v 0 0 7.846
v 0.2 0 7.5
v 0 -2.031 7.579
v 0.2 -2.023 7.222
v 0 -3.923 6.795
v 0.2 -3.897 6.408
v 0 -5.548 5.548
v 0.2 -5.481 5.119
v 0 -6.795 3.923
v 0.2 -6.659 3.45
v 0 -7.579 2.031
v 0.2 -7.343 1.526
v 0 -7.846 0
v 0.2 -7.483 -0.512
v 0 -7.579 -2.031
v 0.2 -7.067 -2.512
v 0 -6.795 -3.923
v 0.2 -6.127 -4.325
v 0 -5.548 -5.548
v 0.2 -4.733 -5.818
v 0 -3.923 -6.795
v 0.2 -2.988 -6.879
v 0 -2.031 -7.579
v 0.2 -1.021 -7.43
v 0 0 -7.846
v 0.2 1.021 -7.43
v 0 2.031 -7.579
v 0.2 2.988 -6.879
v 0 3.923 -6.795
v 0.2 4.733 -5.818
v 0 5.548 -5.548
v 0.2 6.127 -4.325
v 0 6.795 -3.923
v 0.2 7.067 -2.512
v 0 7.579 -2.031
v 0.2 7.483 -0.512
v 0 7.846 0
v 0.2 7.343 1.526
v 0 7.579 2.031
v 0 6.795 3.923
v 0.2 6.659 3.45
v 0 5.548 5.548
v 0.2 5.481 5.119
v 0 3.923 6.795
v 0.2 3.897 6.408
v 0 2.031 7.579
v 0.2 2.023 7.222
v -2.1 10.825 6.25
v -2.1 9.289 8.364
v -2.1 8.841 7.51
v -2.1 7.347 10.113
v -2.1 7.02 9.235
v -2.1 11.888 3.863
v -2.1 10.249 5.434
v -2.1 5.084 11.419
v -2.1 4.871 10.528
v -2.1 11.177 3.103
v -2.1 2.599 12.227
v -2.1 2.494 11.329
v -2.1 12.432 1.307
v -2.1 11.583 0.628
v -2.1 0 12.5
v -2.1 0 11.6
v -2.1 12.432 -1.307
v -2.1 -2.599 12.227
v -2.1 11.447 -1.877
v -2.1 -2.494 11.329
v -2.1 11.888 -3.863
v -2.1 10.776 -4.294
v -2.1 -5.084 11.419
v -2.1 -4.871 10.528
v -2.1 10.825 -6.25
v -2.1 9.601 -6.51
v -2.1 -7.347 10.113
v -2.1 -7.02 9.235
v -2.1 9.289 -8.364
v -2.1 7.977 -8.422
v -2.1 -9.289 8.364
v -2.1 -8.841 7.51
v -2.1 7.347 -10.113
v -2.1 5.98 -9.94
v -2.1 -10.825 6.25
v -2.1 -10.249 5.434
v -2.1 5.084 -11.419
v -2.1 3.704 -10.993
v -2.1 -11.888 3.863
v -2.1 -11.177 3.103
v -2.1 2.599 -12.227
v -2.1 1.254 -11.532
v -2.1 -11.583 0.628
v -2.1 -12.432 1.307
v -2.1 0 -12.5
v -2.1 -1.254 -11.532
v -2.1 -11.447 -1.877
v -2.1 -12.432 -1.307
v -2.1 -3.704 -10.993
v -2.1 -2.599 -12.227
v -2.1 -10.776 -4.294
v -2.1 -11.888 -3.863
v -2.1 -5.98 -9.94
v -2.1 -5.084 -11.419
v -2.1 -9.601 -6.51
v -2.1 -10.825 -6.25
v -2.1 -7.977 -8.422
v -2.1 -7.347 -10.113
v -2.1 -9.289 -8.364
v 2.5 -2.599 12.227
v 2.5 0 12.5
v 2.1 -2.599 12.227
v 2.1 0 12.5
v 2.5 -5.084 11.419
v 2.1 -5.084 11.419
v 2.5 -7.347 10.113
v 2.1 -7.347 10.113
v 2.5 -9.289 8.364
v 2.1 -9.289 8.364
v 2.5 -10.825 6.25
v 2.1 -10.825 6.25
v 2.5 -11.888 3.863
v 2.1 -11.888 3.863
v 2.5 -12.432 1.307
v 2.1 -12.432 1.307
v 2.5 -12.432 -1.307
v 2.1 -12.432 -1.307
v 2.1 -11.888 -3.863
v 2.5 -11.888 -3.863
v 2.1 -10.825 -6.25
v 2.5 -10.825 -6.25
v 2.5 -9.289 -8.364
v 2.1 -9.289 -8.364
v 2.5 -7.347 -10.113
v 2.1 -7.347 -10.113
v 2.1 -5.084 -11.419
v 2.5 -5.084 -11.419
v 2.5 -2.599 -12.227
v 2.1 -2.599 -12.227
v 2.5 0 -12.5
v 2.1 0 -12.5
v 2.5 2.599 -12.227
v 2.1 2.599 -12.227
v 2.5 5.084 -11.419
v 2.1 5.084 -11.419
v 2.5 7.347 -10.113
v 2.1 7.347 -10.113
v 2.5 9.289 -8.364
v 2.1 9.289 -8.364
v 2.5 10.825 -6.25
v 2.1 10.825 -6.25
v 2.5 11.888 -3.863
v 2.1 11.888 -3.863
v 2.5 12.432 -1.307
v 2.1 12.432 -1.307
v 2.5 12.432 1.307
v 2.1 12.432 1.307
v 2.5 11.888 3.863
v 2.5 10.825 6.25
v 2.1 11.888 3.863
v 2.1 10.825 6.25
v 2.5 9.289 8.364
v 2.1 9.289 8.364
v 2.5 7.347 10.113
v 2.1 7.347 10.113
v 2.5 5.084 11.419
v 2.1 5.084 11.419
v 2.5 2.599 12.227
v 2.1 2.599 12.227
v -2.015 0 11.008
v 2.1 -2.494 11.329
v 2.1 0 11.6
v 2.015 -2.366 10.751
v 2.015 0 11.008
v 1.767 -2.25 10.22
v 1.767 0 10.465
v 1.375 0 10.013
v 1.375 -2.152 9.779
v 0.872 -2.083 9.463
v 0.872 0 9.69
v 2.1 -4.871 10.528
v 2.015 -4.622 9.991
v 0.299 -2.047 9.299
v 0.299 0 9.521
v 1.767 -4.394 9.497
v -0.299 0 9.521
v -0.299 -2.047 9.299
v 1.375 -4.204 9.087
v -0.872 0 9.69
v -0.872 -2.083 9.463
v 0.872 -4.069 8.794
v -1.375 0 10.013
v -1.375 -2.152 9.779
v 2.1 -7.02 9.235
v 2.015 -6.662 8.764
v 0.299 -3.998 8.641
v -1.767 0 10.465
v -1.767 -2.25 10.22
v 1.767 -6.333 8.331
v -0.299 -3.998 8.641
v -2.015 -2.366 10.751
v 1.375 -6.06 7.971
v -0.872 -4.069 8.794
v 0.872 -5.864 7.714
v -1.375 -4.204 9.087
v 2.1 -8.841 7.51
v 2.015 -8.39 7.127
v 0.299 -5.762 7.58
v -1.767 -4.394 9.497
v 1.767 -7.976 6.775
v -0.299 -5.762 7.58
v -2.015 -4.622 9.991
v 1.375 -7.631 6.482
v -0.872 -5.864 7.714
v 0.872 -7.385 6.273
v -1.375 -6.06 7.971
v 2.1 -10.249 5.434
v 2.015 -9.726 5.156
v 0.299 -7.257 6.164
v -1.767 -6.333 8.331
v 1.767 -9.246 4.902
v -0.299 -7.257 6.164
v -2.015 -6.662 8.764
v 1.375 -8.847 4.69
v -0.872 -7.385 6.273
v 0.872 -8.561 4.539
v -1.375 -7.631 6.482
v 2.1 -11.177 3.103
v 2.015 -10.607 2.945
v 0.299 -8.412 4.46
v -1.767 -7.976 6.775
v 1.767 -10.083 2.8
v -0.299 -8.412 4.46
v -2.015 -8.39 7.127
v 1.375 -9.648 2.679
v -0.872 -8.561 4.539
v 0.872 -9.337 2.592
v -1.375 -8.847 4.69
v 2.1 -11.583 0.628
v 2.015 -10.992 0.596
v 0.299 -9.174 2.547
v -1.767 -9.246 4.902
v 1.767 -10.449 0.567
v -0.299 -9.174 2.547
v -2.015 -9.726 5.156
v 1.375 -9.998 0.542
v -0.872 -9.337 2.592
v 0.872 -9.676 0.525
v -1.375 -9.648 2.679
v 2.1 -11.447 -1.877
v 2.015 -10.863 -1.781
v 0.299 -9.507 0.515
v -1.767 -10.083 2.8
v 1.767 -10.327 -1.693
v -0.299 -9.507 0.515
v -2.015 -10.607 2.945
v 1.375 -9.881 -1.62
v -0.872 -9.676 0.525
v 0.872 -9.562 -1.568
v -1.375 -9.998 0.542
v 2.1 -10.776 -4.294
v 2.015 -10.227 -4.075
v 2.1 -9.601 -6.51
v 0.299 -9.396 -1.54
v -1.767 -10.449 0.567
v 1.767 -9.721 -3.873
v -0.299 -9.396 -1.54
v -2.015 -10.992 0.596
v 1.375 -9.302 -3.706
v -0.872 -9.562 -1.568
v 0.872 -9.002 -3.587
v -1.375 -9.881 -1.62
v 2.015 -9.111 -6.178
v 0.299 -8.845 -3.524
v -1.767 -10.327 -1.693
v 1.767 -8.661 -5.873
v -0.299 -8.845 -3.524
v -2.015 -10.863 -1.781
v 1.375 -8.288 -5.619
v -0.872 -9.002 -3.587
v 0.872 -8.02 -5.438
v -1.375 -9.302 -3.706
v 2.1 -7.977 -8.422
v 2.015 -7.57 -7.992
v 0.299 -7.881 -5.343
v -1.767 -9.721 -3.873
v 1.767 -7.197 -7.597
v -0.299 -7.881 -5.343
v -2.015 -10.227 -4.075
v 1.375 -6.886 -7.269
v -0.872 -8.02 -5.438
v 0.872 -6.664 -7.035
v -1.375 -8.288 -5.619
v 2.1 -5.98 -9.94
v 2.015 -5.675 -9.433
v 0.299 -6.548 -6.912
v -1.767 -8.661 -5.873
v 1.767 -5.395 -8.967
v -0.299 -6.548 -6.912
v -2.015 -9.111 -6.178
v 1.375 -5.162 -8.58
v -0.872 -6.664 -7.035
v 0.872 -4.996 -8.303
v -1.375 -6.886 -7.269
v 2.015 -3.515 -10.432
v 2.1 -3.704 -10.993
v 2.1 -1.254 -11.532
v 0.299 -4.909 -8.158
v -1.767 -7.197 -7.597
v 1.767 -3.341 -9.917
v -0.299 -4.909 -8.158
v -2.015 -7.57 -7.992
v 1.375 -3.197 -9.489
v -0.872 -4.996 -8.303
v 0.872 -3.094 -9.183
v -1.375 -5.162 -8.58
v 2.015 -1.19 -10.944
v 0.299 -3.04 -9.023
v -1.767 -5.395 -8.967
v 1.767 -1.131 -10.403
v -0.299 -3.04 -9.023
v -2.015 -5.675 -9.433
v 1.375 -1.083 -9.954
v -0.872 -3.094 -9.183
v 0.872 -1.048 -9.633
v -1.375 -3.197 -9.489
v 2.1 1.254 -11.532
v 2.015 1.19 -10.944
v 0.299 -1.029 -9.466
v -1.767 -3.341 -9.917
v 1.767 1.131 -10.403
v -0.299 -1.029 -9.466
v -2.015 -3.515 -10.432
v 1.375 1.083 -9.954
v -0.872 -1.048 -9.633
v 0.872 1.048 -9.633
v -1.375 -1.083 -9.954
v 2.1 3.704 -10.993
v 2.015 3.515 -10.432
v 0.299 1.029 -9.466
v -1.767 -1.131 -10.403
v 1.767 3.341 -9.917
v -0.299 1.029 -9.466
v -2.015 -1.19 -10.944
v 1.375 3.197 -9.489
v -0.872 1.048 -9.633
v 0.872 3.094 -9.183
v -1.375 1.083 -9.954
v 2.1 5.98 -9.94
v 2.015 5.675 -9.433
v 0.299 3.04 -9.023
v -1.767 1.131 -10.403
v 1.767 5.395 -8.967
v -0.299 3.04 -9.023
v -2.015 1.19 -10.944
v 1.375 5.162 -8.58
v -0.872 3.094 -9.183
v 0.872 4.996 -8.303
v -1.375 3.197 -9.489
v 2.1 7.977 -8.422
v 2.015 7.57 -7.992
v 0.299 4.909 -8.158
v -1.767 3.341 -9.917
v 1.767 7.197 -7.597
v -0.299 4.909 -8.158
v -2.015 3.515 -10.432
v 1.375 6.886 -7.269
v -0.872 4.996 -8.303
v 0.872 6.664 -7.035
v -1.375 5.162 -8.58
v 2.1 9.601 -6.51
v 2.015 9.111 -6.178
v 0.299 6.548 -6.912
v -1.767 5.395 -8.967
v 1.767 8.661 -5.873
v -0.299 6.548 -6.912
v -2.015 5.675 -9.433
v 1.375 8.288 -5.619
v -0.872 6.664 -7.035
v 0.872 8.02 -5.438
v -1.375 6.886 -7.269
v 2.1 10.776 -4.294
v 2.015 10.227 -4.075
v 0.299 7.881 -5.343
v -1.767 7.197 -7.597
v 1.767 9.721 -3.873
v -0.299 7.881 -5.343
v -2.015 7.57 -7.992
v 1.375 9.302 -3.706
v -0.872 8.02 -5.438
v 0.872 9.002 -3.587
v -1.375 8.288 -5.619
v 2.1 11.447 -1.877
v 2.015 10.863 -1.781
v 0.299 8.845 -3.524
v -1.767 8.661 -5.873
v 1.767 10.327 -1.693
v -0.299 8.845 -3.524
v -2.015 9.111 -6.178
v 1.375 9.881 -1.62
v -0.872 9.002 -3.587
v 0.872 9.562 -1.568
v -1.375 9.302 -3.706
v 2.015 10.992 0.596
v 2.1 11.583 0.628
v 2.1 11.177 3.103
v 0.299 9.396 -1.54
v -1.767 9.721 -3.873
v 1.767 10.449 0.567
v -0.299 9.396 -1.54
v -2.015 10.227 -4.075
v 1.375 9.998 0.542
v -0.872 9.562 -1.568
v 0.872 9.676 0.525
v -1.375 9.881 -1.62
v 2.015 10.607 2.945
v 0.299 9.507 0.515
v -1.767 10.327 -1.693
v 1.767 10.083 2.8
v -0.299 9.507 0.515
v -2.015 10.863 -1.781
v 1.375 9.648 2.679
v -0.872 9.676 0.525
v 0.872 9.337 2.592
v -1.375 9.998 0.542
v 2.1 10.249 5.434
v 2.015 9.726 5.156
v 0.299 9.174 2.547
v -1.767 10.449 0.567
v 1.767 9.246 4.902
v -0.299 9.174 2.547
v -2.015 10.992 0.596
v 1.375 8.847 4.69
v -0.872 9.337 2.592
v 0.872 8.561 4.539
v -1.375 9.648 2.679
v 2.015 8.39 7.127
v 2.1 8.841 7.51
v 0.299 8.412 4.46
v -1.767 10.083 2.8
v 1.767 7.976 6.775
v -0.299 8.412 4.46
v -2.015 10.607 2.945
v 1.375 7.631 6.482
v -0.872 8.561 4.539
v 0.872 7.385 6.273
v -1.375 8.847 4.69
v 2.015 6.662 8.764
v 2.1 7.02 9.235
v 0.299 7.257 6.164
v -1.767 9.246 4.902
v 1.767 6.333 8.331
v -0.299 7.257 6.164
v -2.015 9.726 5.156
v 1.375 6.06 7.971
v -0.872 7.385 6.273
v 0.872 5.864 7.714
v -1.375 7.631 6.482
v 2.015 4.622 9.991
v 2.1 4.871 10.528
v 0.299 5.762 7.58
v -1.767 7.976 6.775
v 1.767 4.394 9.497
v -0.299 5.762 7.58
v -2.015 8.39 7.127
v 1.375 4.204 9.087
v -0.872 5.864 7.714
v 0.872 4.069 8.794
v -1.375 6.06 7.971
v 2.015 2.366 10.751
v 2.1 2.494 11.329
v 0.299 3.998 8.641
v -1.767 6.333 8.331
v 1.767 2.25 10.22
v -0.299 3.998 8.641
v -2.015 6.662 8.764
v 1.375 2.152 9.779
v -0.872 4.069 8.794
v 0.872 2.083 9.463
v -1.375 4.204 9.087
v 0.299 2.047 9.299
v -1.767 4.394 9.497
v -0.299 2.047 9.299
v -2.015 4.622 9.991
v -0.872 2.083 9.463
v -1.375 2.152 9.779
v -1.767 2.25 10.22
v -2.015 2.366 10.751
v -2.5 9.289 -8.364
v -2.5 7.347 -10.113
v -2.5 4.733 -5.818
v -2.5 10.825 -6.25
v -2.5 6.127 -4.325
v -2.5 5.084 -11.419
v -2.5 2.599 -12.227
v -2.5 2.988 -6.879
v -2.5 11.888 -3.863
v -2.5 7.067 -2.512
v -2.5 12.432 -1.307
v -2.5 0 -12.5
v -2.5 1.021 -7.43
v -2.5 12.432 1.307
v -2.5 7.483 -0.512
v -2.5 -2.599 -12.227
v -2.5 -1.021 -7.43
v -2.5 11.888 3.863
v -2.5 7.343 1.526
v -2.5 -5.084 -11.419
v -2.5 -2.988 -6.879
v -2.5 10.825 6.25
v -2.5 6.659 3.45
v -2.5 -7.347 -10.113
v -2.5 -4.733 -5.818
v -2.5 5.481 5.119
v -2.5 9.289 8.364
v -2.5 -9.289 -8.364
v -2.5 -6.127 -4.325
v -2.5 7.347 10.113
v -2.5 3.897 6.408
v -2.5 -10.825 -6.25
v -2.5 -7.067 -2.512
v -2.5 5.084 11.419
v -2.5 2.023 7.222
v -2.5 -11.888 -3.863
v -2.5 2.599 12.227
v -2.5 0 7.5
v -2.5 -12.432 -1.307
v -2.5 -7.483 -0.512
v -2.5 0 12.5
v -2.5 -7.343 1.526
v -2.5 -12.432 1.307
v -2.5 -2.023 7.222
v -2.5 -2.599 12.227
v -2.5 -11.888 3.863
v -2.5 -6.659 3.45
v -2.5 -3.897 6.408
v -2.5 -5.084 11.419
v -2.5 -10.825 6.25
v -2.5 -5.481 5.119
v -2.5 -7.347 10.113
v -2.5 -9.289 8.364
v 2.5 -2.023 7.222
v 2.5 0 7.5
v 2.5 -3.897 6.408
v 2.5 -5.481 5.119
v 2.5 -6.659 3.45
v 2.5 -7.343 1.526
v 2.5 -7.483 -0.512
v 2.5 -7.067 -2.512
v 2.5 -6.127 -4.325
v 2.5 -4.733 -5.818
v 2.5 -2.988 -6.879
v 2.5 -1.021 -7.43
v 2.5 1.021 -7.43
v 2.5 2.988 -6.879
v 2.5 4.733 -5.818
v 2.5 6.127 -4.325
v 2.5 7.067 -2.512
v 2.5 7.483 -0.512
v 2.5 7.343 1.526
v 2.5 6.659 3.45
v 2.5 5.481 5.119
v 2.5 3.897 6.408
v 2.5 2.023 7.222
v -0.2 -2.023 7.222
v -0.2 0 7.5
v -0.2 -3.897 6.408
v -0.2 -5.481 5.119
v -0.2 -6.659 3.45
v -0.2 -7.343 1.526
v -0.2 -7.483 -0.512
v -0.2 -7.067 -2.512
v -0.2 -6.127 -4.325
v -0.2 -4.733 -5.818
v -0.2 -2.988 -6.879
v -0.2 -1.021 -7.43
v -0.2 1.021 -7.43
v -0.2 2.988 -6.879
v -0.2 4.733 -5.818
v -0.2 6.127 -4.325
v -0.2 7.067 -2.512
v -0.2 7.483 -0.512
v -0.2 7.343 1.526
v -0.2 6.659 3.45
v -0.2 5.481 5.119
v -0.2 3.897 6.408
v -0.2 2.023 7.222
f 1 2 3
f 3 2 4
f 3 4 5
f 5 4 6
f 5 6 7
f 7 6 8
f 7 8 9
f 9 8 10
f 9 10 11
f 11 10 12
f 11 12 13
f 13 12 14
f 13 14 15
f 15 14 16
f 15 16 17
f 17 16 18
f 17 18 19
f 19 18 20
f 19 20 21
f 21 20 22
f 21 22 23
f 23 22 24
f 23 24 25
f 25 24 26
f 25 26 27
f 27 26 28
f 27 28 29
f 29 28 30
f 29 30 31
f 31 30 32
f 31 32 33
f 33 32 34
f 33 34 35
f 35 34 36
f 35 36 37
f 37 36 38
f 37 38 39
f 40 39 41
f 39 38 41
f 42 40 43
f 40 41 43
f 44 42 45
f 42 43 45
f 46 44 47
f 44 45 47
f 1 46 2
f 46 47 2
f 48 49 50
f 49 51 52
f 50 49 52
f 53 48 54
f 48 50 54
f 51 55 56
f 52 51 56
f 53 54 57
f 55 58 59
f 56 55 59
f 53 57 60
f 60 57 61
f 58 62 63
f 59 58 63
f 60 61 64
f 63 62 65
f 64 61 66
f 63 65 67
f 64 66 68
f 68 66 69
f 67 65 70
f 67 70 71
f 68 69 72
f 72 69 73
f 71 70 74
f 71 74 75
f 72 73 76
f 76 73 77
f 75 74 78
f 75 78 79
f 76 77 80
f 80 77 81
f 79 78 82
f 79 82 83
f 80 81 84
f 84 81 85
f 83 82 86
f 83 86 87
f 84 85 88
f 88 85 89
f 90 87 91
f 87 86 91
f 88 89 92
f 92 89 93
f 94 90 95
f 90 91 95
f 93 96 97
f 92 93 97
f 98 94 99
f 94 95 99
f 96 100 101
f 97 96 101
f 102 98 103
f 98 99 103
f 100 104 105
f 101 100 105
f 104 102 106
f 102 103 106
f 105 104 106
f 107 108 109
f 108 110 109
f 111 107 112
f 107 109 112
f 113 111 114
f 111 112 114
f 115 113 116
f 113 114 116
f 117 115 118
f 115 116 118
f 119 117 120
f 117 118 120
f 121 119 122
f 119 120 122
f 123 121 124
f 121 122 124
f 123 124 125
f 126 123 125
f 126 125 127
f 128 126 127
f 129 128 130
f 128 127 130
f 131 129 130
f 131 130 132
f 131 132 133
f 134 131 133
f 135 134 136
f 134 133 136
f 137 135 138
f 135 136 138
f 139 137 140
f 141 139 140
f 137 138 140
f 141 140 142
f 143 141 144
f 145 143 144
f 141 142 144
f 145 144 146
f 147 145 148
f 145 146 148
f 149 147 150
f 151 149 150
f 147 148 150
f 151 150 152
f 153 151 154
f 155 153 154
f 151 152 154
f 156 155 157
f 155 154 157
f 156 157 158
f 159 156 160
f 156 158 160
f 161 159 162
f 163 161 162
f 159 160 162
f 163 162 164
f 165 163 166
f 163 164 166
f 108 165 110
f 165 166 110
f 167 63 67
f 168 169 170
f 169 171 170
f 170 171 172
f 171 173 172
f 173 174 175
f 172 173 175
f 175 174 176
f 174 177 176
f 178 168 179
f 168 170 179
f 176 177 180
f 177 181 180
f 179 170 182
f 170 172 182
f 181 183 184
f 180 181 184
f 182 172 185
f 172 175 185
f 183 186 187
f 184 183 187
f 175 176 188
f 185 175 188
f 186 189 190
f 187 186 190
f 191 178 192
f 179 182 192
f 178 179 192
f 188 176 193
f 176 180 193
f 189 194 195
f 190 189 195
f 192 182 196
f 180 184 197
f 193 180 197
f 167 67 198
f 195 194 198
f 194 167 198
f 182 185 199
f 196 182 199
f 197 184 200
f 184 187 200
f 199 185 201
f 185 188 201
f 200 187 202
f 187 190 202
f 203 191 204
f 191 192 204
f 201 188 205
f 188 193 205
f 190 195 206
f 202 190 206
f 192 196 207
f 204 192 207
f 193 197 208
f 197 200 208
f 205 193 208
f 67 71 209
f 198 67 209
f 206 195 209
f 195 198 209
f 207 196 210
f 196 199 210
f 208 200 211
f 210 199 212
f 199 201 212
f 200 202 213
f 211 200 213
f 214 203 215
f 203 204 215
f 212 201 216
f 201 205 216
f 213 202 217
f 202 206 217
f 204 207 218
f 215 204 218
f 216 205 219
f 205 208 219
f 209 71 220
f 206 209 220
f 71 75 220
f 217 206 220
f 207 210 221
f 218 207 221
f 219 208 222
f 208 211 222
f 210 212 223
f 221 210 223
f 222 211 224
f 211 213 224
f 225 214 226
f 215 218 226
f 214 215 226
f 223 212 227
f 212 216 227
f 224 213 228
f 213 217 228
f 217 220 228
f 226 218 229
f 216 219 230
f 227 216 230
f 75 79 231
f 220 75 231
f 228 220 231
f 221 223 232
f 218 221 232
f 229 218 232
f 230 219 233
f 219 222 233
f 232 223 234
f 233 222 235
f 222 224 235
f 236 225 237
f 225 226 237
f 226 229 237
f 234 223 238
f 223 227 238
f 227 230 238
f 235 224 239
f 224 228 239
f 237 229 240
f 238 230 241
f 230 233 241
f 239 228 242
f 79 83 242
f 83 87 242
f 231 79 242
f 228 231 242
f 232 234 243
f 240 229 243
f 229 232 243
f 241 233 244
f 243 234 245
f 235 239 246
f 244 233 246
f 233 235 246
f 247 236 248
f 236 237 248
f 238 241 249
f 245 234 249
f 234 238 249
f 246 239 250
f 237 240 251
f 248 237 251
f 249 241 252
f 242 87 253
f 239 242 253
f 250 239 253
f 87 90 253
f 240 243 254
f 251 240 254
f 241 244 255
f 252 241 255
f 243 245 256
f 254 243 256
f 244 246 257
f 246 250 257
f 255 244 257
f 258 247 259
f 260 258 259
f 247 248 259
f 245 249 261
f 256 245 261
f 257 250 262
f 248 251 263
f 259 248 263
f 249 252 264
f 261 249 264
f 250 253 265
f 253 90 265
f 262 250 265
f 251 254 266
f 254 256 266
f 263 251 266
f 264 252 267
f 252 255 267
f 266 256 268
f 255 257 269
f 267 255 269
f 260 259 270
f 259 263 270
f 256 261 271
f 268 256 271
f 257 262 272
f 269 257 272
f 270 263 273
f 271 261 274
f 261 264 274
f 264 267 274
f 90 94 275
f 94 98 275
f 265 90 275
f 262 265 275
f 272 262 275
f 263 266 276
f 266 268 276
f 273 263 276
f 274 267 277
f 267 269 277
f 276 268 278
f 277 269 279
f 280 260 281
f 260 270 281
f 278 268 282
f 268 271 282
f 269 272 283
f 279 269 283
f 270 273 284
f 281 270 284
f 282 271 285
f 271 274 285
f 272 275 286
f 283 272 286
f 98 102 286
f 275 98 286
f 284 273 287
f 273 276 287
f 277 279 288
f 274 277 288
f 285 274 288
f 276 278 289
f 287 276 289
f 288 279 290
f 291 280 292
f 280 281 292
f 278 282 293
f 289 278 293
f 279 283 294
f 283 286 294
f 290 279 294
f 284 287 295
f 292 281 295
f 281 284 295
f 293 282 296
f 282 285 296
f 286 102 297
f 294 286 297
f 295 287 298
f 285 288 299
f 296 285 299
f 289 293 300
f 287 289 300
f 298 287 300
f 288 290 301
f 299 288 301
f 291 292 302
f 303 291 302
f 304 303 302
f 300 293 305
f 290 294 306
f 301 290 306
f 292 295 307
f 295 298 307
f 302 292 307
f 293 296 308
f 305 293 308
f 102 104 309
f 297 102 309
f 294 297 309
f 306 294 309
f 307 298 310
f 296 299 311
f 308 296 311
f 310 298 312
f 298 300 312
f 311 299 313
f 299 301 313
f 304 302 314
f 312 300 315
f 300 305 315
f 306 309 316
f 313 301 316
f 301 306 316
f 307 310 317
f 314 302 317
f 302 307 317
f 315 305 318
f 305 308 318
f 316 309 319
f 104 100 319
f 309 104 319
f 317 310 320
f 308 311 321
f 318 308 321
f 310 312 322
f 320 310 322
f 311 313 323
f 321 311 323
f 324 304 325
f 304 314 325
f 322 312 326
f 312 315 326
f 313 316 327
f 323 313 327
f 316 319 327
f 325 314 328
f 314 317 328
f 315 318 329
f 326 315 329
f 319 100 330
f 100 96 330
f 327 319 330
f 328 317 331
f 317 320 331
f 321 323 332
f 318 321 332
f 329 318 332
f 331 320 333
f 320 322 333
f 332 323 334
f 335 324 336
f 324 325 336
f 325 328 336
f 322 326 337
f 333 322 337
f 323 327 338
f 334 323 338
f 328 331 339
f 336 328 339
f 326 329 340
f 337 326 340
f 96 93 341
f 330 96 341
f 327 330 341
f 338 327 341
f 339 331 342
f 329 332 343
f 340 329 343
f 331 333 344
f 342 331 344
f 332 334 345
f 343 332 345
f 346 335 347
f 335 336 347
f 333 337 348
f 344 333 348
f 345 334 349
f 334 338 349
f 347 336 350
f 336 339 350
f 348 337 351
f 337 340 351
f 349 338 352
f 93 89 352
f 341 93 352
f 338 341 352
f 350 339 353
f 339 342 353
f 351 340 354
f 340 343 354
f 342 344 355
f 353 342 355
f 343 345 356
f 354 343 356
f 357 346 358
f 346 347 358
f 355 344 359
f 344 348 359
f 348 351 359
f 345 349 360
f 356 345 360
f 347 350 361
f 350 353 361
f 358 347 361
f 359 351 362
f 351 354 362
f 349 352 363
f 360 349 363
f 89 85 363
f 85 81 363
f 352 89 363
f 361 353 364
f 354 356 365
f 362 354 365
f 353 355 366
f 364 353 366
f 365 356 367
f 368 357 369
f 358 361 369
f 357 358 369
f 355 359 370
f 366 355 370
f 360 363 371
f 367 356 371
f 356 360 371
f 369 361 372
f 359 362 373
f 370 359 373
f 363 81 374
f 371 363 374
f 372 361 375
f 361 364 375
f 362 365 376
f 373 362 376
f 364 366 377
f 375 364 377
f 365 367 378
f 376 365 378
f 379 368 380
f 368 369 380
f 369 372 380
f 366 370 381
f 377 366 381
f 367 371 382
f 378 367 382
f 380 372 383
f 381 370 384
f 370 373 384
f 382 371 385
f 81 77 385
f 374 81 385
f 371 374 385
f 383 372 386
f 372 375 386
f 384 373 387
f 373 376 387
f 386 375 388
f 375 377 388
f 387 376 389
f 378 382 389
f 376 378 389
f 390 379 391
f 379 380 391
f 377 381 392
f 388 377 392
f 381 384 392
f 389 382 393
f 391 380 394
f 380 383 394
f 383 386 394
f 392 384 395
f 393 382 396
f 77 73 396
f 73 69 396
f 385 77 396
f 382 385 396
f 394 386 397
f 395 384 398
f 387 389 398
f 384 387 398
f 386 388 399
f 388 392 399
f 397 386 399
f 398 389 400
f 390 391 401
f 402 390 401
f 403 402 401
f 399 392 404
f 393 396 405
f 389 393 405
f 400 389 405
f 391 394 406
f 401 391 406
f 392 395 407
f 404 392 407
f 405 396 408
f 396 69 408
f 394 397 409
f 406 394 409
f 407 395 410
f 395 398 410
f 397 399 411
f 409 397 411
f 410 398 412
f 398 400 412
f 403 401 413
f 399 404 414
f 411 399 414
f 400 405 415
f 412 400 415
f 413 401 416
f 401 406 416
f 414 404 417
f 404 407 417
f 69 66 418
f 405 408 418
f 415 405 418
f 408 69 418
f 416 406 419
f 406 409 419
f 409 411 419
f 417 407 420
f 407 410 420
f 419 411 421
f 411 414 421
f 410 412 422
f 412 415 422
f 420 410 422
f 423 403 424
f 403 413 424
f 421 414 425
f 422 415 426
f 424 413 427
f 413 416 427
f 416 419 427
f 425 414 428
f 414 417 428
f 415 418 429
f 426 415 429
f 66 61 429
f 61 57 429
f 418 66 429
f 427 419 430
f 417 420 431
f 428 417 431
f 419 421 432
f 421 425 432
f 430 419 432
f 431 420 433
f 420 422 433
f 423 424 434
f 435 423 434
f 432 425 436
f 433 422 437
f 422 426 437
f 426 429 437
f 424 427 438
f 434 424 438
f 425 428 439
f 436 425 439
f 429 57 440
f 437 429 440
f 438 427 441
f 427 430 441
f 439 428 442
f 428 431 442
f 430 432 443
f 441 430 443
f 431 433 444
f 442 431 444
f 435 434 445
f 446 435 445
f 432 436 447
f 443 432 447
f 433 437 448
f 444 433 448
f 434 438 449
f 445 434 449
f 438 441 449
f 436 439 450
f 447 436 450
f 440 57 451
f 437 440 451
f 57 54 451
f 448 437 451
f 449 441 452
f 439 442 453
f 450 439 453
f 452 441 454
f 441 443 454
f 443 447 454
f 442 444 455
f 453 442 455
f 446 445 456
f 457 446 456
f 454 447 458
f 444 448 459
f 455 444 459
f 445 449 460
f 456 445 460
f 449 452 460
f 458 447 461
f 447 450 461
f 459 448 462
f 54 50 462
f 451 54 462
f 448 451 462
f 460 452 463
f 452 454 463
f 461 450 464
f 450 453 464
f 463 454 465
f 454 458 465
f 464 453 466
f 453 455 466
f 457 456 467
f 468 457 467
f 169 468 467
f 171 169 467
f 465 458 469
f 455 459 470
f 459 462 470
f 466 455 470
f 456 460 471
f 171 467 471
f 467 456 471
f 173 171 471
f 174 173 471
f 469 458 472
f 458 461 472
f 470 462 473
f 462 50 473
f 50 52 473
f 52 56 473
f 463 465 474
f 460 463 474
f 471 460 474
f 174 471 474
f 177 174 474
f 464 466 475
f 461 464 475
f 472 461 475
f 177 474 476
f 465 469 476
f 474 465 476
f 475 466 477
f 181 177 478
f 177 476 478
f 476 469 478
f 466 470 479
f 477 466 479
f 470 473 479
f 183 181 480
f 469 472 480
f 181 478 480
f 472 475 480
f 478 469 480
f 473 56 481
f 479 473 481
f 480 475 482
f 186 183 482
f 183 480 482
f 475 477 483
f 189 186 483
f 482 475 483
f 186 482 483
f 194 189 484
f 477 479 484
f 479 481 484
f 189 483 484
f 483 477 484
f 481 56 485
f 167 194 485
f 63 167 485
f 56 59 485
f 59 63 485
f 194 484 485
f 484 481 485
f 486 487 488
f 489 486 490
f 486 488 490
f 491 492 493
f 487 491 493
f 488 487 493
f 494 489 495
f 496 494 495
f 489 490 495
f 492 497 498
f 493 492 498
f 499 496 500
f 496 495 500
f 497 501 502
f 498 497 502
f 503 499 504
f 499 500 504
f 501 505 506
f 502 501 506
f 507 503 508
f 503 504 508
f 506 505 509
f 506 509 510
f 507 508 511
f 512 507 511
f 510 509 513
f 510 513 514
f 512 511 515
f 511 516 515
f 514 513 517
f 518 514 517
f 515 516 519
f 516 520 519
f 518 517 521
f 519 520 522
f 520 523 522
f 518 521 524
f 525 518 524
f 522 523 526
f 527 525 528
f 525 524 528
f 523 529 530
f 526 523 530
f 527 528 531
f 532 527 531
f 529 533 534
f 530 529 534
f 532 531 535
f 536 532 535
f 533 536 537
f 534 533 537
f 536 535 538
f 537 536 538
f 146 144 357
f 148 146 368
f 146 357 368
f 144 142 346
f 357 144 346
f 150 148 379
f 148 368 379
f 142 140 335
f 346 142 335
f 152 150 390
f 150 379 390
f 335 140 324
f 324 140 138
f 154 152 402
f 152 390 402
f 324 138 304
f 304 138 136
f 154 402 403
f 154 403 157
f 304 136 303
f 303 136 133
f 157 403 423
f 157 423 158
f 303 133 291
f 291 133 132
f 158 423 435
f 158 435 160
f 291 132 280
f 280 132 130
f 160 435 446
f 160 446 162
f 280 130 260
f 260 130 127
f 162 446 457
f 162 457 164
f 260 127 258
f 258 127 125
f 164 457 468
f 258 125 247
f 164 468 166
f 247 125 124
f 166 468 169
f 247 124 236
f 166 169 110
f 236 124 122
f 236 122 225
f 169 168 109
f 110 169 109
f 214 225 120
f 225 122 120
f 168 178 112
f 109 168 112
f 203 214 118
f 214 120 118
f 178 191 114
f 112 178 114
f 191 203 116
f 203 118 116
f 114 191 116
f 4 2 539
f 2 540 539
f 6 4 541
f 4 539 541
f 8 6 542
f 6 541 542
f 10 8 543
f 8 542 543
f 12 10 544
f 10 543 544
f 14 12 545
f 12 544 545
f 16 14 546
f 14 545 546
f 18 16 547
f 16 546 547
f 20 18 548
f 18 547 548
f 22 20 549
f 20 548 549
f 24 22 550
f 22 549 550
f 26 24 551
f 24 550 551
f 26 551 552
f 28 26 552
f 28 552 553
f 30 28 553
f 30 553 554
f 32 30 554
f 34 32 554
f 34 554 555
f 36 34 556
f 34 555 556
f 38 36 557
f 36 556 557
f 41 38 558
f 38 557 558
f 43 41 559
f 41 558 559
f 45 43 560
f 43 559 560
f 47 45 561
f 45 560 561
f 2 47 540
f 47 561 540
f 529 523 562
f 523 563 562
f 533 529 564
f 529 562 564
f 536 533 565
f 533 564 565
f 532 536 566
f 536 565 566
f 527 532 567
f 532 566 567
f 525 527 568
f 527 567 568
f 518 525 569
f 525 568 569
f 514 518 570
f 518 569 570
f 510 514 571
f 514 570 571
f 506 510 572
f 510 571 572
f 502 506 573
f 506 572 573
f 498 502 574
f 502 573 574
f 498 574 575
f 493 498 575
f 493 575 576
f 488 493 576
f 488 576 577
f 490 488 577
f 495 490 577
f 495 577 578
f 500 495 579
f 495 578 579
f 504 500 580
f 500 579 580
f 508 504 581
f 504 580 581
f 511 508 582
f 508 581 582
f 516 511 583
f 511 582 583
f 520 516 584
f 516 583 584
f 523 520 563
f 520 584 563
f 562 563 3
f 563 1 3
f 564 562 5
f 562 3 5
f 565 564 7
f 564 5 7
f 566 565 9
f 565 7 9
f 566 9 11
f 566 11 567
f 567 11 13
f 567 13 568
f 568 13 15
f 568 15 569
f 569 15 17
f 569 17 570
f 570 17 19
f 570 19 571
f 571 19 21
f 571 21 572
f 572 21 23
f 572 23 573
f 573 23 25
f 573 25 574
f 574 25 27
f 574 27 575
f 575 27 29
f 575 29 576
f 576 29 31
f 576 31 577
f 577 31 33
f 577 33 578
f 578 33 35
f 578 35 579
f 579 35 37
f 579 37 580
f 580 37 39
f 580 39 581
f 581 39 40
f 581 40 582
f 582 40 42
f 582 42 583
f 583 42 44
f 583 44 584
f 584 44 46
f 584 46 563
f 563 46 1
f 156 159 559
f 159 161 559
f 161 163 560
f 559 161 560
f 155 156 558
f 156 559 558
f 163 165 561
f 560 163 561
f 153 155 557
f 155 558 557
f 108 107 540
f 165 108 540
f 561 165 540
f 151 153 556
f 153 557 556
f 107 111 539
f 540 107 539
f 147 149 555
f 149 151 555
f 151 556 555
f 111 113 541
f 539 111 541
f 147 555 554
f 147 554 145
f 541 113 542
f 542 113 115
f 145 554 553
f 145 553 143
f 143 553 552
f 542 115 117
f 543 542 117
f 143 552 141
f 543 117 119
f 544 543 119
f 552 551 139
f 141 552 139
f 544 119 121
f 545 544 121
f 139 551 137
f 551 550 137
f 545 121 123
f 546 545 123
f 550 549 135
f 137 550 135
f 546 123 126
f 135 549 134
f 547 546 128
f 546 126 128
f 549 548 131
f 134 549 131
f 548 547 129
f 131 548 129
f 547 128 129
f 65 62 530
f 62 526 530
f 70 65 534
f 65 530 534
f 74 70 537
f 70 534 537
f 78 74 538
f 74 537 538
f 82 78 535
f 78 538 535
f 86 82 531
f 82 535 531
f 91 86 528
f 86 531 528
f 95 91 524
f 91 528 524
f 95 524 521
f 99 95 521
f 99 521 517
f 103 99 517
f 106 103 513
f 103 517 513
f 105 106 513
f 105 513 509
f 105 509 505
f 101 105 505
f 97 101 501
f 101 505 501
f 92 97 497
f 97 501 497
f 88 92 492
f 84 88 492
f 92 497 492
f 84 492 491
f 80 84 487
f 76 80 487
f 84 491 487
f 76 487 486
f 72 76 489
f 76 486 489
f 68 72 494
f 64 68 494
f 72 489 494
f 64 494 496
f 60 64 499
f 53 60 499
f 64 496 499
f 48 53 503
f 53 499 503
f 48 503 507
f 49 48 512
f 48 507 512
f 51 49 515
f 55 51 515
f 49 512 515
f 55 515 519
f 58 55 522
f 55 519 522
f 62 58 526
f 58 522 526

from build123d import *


with BuildPart() as part:
    # Sketch1 → Revolve1 (revolve)
    with BuildSketch(Plane.XY, mode=Mode.PRIVATE) as revolve1_sk:
        with BuildLine():
            Line((-2.5, 7.5), (-0.2, 7.5))
            Line((-0.2, 7.5), (0, 7.846410162))
            Line((0, 7.846410162), (0.2, 7.5))
            Line((0.2, 7.5), (2.5, 7.5))
            Line((2.5, 7.5), (2.5, 12.5))
            Line((2.5, 12.5), (2.1, 12.5))
            Line((2.1, 12.5), (2.1, 11.6))
            ThreePointArc((2.1, 11.6), (0, 9.5), (-2.1, 11.6))
            Line((-2.1, 11.6), (-2.1, 12.5))
            Line((-2.1, 12.5), (-2.5, 12.5))
            Line((-2.5, 12.5), (-2.5, 7.5))
        make_face()
    revolve(revolve1_sk.sketch.rotate(Axis((-2.5, 0, 0), (1, 0, 0)), 90), axis=Axis((-2.5, 0, 0), (1, 0, 0)))


solid = part.part
